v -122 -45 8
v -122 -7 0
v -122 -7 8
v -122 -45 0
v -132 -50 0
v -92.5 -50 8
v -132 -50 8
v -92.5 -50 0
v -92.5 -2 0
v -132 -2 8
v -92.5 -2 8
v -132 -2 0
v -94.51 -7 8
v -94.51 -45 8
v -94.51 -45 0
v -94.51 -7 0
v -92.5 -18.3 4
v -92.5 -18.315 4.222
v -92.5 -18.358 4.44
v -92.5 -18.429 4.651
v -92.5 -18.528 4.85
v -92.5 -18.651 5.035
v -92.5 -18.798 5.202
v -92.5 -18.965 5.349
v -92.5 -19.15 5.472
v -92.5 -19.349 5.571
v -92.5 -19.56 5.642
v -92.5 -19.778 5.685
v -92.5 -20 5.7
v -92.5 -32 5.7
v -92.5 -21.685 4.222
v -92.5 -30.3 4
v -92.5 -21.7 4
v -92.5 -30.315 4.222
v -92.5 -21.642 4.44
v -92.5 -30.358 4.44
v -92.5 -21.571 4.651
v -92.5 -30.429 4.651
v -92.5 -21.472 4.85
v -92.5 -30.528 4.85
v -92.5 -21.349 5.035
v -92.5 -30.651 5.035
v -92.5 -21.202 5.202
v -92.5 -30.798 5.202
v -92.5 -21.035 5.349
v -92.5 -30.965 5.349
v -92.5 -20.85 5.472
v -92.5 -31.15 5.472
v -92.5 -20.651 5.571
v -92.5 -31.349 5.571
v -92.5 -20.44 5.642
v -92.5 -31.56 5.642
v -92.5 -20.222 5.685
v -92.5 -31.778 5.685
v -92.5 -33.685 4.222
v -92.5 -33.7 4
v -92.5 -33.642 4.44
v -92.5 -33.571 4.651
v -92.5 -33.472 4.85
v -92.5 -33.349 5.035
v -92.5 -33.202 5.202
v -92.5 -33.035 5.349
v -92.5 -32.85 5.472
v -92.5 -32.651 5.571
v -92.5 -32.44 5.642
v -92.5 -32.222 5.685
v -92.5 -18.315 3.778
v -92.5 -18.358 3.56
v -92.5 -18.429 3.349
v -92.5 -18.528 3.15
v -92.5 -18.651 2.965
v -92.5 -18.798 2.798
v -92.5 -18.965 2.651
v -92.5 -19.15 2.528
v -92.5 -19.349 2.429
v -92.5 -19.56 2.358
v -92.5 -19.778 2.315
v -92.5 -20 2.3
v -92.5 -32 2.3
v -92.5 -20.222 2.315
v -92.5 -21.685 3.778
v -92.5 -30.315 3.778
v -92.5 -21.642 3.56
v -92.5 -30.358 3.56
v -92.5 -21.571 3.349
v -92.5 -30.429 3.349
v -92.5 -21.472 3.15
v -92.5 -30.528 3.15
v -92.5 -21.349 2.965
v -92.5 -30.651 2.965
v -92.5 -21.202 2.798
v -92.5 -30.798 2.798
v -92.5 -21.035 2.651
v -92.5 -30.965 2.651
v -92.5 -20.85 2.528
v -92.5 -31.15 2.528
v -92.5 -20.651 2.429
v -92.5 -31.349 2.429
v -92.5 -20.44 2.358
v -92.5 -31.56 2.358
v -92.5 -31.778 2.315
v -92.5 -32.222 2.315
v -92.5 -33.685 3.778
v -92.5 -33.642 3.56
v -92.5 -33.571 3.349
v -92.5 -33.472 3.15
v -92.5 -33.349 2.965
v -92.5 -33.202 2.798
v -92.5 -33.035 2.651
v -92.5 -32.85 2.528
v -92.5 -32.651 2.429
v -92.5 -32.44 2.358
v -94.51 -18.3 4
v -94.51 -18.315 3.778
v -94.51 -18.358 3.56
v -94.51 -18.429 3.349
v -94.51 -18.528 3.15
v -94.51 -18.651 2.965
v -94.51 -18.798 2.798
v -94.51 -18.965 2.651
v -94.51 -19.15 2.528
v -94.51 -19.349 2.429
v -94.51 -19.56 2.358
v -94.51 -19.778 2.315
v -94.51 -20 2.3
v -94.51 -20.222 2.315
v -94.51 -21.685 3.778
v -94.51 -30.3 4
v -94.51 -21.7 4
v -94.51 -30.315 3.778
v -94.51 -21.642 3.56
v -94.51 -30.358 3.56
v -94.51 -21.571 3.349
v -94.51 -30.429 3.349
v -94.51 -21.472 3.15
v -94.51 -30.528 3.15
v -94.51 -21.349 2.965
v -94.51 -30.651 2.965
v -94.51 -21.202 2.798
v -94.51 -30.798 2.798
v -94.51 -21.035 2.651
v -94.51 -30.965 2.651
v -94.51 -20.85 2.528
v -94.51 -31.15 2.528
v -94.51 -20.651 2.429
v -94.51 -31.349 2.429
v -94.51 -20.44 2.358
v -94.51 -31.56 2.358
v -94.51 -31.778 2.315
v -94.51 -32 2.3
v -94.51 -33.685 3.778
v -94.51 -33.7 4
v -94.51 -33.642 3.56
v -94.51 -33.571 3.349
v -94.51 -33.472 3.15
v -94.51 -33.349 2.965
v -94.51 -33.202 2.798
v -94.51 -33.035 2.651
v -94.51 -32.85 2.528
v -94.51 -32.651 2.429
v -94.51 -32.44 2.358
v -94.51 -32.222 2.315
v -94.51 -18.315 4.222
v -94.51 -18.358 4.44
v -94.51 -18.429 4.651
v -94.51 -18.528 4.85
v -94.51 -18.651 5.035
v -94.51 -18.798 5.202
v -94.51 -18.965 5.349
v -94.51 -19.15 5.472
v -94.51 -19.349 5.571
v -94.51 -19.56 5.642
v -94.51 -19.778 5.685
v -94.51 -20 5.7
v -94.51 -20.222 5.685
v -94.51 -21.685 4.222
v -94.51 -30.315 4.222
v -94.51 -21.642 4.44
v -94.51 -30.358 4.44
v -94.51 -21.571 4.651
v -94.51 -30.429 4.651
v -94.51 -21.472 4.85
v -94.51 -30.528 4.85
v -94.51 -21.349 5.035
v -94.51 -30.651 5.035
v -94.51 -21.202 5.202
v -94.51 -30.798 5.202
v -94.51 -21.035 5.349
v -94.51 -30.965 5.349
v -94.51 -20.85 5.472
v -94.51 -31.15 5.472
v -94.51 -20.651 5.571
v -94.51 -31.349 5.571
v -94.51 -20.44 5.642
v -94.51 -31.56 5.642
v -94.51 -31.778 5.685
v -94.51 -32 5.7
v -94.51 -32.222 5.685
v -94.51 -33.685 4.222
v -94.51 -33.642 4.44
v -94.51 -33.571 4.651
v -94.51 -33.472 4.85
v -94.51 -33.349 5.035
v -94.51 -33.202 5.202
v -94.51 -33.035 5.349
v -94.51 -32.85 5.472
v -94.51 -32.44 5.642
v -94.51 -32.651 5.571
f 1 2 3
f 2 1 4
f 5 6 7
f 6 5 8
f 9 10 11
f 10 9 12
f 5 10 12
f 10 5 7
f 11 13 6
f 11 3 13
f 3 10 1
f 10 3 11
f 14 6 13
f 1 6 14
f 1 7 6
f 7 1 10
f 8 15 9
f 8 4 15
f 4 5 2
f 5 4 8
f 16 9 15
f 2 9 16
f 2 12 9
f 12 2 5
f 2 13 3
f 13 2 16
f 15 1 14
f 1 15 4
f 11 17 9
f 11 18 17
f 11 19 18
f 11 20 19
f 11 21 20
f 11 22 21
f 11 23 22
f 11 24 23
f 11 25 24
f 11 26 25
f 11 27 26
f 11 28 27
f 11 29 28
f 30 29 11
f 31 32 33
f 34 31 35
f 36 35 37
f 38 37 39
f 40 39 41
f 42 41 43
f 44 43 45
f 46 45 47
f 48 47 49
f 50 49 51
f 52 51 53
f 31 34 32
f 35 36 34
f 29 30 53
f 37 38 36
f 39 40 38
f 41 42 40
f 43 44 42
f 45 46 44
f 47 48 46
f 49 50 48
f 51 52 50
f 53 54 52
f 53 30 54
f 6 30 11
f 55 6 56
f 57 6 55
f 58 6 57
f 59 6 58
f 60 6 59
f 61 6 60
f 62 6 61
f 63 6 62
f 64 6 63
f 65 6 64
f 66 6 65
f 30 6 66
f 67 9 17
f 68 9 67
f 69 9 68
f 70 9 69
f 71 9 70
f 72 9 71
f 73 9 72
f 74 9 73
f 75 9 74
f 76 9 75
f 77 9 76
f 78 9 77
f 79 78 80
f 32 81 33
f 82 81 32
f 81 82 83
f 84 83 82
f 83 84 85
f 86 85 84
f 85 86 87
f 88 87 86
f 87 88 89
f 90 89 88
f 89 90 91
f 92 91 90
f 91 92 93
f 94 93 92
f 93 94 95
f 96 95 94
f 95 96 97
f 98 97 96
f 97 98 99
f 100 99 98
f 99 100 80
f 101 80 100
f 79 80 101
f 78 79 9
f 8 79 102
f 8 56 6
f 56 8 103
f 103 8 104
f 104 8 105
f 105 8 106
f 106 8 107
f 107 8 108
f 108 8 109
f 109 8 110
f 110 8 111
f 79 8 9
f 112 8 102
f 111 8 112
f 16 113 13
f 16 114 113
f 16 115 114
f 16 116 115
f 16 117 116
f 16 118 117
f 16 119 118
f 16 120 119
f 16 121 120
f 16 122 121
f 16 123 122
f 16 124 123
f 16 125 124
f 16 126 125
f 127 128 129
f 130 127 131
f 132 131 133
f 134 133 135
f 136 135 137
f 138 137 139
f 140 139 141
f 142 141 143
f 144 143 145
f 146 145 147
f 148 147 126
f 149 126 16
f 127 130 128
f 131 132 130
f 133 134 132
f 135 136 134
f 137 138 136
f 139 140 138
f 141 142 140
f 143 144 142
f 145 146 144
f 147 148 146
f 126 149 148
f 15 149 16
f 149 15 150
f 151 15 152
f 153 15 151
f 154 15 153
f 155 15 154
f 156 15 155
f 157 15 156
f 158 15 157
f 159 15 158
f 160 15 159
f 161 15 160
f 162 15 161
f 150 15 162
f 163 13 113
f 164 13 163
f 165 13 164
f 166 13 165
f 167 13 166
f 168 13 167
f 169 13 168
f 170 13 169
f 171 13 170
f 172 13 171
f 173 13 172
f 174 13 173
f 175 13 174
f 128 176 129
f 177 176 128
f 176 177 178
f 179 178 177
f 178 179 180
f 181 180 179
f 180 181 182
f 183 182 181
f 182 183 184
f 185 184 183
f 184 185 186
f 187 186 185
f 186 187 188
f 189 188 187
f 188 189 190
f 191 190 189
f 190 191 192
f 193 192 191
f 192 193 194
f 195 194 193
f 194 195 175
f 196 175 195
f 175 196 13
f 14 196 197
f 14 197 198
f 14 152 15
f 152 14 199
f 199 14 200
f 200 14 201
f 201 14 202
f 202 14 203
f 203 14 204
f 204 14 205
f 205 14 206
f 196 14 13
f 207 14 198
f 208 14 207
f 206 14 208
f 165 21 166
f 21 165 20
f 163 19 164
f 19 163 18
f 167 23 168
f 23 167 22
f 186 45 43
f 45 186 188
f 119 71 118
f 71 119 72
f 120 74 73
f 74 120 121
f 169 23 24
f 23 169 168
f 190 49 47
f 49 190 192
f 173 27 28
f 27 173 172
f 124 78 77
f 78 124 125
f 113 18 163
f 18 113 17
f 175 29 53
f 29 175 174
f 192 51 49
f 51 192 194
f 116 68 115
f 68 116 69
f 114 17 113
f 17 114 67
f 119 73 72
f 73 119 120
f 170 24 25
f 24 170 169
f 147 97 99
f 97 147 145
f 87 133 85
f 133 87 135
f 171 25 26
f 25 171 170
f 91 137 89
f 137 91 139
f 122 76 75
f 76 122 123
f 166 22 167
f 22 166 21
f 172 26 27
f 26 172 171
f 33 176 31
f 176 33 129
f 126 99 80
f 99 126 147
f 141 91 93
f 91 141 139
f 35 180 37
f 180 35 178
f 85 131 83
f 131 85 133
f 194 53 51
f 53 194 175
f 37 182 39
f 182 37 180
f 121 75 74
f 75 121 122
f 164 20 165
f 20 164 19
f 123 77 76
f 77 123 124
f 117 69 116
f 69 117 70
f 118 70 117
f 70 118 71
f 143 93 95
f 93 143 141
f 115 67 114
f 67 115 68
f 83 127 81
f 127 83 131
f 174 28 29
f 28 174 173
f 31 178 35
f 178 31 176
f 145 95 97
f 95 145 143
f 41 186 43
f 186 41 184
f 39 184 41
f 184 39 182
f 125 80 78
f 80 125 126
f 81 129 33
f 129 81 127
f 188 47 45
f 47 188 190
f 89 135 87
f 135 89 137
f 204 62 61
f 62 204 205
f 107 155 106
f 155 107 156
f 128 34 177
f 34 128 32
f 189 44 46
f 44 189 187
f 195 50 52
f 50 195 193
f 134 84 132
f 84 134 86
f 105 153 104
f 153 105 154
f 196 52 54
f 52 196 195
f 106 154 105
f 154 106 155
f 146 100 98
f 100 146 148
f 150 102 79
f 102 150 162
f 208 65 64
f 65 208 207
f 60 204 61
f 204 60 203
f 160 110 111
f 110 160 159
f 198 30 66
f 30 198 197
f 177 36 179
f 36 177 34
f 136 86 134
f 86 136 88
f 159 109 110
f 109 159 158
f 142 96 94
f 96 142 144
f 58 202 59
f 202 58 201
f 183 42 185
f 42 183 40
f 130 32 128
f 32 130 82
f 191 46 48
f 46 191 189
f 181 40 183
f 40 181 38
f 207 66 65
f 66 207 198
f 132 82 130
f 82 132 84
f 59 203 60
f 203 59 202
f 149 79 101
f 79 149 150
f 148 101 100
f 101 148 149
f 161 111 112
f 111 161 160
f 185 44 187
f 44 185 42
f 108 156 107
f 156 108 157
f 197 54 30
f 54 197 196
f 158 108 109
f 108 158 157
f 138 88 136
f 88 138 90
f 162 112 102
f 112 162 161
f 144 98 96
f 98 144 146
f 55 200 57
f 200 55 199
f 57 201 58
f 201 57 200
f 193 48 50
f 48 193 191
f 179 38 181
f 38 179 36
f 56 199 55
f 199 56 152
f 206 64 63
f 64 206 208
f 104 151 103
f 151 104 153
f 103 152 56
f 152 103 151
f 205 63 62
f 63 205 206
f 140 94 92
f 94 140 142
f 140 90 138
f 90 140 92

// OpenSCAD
// handle.scad -- the fixed grip handle (task.py: _psu_boxes grip bar and arms), SUPPLY frame, mm.
//
// The bar (HANDLE_BAR) on its two arms (HANDLE_ARM_LO, HANDLE_ARM_HI), plus a spine joining the arms' ends that sits
// in a recess in the face plate (flush with it, FIT_PRESS clearance) and is bolted through the front wall with two
// M3 screws (heads inside the supply, nuts on the spine between the arms). In task.py the upper arm ends in the air
// above the face; the spine is what holds it on a real part.
// Print lying on its side (an 8 mm face on the bed): the bar, arms and spine are then one continuous outline.

include <params.scad>

PART = "handle";

module handle() {
    difference() {
        union() {
            box6(HANDLE_BAR);
            box6(HANDLE_ARM_LO);
            box6(HANDLE_ARM_HI);
            // the spine, in the face plate's recess
            translate([FACEPLATE[0] - EPS, HANDLE_BAR[2], HANDLE_BAR[4]])
                cube([FACEPLATE[1] - FACEPLATE[0] + EPS, HANDLE_BAR[3] - HANDLE_BAR[2], HANDLE_BAR[5] - HANDLE_BAR[4]]);
        }
        for (z = HANDLE_SCREW_Z)
            translate([FACEPLATE[0] - EPS, (HANDLE_BAR[2] + HANDLE_BAR[3]) / 2, z]) rotate([0, 90, 0])
                cylinder(h = FACEPLATE[1] - FACEPLATE[0] + 2 * EPS, d = M3_CLEAR);
    }
}

if (PART == "handle") rotate([90, 0, 0]) translate([0, -HANDLE_BAR[2], 0]) handle();
else if (PART == "assembly") handle();
